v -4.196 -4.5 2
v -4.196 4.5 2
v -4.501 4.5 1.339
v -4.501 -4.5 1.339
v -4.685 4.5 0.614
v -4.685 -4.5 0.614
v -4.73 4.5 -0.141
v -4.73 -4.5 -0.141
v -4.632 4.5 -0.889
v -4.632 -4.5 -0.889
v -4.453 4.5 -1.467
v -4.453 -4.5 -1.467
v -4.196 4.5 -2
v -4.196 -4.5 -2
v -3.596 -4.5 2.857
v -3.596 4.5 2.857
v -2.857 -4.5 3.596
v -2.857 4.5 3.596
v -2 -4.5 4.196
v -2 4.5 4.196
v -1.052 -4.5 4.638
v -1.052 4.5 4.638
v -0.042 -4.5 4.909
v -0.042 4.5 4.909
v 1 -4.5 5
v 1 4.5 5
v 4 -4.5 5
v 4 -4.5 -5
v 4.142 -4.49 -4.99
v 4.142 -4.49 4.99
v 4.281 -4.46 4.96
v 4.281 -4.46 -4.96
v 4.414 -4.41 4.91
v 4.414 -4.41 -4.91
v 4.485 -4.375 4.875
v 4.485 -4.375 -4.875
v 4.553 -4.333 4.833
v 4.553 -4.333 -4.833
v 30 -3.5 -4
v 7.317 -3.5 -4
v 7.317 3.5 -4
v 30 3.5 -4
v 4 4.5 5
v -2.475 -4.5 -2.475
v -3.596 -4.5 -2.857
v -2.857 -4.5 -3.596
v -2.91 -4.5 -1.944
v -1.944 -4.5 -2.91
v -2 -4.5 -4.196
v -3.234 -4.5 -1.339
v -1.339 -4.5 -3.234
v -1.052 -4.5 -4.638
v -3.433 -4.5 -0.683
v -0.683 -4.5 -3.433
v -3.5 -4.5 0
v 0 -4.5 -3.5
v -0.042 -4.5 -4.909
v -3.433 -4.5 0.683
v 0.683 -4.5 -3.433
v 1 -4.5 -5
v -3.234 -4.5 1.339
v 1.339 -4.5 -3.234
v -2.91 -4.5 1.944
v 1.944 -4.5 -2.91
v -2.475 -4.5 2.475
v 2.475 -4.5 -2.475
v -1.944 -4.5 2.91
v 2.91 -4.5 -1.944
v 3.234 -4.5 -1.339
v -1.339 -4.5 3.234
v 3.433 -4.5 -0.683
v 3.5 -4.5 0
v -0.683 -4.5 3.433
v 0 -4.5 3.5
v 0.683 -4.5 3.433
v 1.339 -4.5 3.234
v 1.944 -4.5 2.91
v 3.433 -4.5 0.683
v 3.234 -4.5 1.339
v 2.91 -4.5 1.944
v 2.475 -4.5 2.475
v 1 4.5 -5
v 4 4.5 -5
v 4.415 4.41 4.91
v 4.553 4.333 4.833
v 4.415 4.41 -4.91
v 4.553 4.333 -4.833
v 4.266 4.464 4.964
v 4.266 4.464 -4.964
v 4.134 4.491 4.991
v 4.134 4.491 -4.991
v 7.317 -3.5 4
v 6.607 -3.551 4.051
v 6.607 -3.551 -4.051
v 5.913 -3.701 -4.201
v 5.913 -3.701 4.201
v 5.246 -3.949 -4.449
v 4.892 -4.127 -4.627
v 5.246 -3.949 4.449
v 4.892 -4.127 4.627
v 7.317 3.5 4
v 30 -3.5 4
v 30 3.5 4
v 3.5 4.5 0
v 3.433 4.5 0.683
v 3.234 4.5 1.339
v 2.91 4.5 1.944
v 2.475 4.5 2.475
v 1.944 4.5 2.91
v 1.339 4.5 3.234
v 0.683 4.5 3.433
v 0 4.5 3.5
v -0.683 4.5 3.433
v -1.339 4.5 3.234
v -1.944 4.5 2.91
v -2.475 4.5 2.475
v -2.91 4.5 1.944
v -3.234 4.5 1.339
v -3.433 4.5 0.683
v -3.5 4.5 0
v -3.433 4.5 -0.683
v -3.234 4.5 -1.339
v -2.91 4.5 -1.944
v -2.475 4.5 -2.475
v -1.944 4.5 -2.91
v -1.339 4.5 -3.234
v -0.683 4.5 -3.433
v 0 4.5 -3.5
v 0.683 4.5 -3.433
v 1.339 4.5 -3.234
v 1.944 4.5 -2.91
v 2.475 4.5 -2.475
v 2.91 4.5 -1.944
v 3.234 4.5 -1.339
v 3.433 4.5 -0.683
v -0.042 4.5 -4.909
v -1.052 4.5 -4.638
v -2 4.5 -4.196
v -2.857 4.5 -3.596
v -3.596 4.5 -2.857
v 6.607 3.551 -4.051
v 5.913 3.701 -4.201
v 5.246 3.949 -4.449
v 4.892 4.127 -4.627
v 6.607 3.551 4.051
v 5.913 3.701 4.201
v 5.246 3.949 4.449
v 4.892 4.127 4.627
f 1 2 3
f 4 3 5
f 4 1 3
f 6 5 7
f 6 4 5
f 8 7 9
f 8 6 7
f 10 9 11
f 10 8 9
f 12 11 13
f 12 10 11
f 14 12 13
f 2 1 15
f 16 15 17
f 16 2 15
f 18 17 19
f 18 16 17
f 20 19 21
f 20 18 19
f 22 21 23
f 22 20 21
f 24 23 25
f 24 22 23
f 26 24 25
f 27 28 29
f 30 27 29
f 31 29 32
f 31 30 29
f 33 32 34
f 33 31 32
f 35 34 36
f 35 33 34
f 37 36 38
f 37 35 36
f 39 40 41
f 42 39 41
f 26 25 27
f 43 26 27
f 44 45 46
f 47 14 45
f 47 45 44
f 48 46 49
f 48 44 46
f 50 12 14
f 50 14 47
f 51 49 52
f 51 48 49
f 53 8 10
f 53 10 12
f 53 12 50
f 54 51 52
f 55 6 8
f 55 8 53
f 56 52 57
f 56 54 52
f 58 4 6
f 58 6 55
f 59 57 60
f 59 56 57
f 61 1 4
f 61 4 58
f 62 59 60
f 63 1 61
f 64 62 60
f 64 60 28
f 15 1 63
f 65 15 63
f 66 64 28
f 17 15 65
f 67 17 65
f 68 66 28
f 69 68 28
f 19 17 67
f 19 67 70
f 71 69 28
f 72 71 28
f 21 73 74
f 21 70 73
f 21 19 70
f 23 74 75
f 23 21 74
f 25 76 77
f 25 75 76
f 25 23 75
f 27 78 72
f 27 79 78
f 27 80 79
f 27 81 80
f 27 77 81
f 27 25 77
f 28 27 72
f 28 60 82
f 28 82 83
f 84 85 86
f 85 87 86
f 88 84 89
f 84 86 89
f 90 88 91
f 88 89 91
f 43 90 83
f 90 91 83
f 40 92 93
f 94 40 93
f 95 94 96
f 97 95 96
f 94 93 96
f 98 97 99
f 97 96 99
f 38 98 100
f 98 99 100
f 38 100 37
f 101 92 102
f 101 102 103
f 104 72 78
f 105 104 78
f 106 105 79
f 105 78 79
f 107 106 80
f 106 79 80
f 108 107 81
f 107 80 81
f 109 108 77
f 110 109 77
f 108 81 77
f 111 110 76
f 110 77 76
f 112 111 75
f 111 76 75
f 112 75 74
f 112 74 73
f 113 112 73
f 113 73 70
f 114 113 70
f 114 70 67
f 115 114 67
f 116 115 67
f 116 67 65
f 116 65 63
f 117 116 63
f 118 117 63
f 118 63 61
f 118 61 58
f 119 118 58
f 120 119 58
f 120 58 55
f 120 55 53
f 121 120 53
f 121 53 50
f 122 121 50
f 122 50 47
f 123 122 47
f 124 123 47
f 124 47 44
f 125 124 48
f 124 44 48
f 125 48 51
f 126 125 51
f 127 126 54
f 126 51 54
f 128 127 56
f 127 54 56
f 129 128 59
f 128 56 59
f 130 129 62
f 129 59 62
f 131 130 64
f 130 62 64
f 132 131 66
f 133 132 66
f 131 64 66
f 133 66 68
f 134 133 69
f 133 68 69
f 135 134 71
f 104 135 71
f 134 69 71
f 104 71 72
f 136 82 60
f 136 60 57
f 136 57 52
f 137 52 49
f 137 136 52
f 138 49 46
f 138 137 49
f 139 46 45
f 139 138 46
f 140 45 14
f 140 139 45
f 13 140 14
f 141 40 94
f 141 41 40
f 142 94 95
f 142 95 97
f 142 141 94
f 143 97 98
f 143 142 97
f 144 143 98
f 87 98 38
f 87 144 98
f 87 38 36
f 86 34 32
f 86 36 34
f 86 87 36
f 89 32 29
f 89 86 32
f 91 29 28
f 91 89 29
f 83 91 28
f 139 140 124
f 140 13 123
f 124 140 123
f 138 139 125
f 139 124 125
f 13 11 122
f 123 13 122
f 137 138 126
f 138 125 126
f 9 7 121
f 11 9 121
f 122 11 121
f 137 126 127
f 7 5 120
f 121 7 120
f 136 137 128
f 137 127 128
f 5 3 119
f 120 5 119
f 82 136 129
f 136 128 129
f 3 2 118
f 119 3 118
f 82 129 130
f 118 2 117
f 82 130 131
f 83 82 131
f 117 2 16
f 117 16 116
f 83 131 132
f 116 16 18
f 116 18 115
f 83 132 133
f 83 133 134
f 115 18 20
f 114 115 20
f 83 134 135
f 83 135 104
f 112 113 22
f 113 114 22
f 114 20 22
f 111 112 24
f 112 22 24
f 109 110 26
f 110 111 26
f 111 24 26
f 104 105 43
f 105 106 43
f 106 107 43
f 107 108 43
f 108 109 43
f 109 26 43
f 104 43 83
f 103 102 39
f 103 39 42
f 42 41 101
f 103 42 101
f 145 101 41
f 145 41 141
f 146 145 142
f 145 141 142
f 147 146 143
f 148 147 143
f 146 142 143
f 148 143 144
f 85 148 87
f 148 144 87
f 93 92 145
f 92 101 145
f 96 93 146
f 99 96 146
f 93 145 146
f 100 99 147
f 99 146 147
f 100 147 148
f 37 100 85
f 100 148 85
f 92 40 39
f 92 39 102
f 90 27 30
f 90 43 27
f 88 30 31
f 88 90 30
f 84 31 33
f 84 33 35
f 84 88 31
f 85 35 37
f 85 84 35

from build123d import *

# Parameters (mm, degrees)
F0_W        = 10
F0_H        = 9
F1_DEPTH    = 5
F3_D        = 7
F4_T1_DEPTH = 39
F5_R        = 1
F6_W        = 7
F6_H        = 8
F7_DEPTH    = 25
F8_R        = 5
F9_R        = 4


# Not quite as in the source:
# - a fillet or chamfer that OpenCascade refuses, or shapes differently, is made with other operations: its cross-section is extruded or revolved along the edge and cut away or added


with BuildPart() as f1:
    # F0 (on Top) → F1 (new body, symmetric)
    with BuildSketch(Plane.XY):
        Rectangle(F0_W, F0_H)
    extrude(amount=F1_DEPTH, both=True)

    # F3 (through all)
    with Locations(Plane(origin=(0, 4.5, 0), x_dir=(-1, 0, 0), z_dir=(0, 1, 0))):
        with Locations((0, 0)):
            Hole(F3_D / 2)

    # F4: fillet of radius 6 on 2 edges, made by hand

    # F4_s2 → F4_t1 (cut)
    with BuildSketch(Plane.XZ.offset(-19.5)):
        with BuildLine():
            ThreePointArc((-5, -1), (-3.2426406871, 3.2426406871), (1, 5))
            Line((1, 5), (-5, 5))
            Line((-5, 5), (-5, -1))
        make_face()
        with BuildLine():
            ThreePointArc((1, -5), (-3.2426406871, -3.2426406871), (-5, 1))
            Line((-5, 1), (-5, -5))
            Line((-5, -5), (1, -5))
        make_face()
    extrude(amount=F4_T1_DEPTH, mode=Mode.SUBTRACT)

    # F5
    f5_edges = [f1.edges().sort_by_distance(p)[0] for p in [
        (5, -4.5, 0),
        (5, 0, -5),
        (5, 4.5, 0),
        (5, 0, 5),
    ]]
    fillet(f5_edges, radius=F5_R)

    # F6 (on face) → F7 (join)
    with BuildSketch(Plane.YZ.offset(5)):
        Rectangle(F6_W, F6_H)
    extrude(amount=F7_DEPTH)

    # F8
    f8_edges = [f1.edges().sort_by_distance(p)[0] for p in [
        (5, 0, 4),
        (5, -3.5, 0),
        (5, 3.5, 0),
        (5, 0, -4),
    ]]
    fillet(f8_edges, radius=F8_R)

    # F9
    f9_edges = [f1.edges().sort_by_distance(p)[0] for p in [
        (-4.91608, 0, 0),
    ]]
    fillet(f9_edges, radius=F9_R)


solid = f1.part
